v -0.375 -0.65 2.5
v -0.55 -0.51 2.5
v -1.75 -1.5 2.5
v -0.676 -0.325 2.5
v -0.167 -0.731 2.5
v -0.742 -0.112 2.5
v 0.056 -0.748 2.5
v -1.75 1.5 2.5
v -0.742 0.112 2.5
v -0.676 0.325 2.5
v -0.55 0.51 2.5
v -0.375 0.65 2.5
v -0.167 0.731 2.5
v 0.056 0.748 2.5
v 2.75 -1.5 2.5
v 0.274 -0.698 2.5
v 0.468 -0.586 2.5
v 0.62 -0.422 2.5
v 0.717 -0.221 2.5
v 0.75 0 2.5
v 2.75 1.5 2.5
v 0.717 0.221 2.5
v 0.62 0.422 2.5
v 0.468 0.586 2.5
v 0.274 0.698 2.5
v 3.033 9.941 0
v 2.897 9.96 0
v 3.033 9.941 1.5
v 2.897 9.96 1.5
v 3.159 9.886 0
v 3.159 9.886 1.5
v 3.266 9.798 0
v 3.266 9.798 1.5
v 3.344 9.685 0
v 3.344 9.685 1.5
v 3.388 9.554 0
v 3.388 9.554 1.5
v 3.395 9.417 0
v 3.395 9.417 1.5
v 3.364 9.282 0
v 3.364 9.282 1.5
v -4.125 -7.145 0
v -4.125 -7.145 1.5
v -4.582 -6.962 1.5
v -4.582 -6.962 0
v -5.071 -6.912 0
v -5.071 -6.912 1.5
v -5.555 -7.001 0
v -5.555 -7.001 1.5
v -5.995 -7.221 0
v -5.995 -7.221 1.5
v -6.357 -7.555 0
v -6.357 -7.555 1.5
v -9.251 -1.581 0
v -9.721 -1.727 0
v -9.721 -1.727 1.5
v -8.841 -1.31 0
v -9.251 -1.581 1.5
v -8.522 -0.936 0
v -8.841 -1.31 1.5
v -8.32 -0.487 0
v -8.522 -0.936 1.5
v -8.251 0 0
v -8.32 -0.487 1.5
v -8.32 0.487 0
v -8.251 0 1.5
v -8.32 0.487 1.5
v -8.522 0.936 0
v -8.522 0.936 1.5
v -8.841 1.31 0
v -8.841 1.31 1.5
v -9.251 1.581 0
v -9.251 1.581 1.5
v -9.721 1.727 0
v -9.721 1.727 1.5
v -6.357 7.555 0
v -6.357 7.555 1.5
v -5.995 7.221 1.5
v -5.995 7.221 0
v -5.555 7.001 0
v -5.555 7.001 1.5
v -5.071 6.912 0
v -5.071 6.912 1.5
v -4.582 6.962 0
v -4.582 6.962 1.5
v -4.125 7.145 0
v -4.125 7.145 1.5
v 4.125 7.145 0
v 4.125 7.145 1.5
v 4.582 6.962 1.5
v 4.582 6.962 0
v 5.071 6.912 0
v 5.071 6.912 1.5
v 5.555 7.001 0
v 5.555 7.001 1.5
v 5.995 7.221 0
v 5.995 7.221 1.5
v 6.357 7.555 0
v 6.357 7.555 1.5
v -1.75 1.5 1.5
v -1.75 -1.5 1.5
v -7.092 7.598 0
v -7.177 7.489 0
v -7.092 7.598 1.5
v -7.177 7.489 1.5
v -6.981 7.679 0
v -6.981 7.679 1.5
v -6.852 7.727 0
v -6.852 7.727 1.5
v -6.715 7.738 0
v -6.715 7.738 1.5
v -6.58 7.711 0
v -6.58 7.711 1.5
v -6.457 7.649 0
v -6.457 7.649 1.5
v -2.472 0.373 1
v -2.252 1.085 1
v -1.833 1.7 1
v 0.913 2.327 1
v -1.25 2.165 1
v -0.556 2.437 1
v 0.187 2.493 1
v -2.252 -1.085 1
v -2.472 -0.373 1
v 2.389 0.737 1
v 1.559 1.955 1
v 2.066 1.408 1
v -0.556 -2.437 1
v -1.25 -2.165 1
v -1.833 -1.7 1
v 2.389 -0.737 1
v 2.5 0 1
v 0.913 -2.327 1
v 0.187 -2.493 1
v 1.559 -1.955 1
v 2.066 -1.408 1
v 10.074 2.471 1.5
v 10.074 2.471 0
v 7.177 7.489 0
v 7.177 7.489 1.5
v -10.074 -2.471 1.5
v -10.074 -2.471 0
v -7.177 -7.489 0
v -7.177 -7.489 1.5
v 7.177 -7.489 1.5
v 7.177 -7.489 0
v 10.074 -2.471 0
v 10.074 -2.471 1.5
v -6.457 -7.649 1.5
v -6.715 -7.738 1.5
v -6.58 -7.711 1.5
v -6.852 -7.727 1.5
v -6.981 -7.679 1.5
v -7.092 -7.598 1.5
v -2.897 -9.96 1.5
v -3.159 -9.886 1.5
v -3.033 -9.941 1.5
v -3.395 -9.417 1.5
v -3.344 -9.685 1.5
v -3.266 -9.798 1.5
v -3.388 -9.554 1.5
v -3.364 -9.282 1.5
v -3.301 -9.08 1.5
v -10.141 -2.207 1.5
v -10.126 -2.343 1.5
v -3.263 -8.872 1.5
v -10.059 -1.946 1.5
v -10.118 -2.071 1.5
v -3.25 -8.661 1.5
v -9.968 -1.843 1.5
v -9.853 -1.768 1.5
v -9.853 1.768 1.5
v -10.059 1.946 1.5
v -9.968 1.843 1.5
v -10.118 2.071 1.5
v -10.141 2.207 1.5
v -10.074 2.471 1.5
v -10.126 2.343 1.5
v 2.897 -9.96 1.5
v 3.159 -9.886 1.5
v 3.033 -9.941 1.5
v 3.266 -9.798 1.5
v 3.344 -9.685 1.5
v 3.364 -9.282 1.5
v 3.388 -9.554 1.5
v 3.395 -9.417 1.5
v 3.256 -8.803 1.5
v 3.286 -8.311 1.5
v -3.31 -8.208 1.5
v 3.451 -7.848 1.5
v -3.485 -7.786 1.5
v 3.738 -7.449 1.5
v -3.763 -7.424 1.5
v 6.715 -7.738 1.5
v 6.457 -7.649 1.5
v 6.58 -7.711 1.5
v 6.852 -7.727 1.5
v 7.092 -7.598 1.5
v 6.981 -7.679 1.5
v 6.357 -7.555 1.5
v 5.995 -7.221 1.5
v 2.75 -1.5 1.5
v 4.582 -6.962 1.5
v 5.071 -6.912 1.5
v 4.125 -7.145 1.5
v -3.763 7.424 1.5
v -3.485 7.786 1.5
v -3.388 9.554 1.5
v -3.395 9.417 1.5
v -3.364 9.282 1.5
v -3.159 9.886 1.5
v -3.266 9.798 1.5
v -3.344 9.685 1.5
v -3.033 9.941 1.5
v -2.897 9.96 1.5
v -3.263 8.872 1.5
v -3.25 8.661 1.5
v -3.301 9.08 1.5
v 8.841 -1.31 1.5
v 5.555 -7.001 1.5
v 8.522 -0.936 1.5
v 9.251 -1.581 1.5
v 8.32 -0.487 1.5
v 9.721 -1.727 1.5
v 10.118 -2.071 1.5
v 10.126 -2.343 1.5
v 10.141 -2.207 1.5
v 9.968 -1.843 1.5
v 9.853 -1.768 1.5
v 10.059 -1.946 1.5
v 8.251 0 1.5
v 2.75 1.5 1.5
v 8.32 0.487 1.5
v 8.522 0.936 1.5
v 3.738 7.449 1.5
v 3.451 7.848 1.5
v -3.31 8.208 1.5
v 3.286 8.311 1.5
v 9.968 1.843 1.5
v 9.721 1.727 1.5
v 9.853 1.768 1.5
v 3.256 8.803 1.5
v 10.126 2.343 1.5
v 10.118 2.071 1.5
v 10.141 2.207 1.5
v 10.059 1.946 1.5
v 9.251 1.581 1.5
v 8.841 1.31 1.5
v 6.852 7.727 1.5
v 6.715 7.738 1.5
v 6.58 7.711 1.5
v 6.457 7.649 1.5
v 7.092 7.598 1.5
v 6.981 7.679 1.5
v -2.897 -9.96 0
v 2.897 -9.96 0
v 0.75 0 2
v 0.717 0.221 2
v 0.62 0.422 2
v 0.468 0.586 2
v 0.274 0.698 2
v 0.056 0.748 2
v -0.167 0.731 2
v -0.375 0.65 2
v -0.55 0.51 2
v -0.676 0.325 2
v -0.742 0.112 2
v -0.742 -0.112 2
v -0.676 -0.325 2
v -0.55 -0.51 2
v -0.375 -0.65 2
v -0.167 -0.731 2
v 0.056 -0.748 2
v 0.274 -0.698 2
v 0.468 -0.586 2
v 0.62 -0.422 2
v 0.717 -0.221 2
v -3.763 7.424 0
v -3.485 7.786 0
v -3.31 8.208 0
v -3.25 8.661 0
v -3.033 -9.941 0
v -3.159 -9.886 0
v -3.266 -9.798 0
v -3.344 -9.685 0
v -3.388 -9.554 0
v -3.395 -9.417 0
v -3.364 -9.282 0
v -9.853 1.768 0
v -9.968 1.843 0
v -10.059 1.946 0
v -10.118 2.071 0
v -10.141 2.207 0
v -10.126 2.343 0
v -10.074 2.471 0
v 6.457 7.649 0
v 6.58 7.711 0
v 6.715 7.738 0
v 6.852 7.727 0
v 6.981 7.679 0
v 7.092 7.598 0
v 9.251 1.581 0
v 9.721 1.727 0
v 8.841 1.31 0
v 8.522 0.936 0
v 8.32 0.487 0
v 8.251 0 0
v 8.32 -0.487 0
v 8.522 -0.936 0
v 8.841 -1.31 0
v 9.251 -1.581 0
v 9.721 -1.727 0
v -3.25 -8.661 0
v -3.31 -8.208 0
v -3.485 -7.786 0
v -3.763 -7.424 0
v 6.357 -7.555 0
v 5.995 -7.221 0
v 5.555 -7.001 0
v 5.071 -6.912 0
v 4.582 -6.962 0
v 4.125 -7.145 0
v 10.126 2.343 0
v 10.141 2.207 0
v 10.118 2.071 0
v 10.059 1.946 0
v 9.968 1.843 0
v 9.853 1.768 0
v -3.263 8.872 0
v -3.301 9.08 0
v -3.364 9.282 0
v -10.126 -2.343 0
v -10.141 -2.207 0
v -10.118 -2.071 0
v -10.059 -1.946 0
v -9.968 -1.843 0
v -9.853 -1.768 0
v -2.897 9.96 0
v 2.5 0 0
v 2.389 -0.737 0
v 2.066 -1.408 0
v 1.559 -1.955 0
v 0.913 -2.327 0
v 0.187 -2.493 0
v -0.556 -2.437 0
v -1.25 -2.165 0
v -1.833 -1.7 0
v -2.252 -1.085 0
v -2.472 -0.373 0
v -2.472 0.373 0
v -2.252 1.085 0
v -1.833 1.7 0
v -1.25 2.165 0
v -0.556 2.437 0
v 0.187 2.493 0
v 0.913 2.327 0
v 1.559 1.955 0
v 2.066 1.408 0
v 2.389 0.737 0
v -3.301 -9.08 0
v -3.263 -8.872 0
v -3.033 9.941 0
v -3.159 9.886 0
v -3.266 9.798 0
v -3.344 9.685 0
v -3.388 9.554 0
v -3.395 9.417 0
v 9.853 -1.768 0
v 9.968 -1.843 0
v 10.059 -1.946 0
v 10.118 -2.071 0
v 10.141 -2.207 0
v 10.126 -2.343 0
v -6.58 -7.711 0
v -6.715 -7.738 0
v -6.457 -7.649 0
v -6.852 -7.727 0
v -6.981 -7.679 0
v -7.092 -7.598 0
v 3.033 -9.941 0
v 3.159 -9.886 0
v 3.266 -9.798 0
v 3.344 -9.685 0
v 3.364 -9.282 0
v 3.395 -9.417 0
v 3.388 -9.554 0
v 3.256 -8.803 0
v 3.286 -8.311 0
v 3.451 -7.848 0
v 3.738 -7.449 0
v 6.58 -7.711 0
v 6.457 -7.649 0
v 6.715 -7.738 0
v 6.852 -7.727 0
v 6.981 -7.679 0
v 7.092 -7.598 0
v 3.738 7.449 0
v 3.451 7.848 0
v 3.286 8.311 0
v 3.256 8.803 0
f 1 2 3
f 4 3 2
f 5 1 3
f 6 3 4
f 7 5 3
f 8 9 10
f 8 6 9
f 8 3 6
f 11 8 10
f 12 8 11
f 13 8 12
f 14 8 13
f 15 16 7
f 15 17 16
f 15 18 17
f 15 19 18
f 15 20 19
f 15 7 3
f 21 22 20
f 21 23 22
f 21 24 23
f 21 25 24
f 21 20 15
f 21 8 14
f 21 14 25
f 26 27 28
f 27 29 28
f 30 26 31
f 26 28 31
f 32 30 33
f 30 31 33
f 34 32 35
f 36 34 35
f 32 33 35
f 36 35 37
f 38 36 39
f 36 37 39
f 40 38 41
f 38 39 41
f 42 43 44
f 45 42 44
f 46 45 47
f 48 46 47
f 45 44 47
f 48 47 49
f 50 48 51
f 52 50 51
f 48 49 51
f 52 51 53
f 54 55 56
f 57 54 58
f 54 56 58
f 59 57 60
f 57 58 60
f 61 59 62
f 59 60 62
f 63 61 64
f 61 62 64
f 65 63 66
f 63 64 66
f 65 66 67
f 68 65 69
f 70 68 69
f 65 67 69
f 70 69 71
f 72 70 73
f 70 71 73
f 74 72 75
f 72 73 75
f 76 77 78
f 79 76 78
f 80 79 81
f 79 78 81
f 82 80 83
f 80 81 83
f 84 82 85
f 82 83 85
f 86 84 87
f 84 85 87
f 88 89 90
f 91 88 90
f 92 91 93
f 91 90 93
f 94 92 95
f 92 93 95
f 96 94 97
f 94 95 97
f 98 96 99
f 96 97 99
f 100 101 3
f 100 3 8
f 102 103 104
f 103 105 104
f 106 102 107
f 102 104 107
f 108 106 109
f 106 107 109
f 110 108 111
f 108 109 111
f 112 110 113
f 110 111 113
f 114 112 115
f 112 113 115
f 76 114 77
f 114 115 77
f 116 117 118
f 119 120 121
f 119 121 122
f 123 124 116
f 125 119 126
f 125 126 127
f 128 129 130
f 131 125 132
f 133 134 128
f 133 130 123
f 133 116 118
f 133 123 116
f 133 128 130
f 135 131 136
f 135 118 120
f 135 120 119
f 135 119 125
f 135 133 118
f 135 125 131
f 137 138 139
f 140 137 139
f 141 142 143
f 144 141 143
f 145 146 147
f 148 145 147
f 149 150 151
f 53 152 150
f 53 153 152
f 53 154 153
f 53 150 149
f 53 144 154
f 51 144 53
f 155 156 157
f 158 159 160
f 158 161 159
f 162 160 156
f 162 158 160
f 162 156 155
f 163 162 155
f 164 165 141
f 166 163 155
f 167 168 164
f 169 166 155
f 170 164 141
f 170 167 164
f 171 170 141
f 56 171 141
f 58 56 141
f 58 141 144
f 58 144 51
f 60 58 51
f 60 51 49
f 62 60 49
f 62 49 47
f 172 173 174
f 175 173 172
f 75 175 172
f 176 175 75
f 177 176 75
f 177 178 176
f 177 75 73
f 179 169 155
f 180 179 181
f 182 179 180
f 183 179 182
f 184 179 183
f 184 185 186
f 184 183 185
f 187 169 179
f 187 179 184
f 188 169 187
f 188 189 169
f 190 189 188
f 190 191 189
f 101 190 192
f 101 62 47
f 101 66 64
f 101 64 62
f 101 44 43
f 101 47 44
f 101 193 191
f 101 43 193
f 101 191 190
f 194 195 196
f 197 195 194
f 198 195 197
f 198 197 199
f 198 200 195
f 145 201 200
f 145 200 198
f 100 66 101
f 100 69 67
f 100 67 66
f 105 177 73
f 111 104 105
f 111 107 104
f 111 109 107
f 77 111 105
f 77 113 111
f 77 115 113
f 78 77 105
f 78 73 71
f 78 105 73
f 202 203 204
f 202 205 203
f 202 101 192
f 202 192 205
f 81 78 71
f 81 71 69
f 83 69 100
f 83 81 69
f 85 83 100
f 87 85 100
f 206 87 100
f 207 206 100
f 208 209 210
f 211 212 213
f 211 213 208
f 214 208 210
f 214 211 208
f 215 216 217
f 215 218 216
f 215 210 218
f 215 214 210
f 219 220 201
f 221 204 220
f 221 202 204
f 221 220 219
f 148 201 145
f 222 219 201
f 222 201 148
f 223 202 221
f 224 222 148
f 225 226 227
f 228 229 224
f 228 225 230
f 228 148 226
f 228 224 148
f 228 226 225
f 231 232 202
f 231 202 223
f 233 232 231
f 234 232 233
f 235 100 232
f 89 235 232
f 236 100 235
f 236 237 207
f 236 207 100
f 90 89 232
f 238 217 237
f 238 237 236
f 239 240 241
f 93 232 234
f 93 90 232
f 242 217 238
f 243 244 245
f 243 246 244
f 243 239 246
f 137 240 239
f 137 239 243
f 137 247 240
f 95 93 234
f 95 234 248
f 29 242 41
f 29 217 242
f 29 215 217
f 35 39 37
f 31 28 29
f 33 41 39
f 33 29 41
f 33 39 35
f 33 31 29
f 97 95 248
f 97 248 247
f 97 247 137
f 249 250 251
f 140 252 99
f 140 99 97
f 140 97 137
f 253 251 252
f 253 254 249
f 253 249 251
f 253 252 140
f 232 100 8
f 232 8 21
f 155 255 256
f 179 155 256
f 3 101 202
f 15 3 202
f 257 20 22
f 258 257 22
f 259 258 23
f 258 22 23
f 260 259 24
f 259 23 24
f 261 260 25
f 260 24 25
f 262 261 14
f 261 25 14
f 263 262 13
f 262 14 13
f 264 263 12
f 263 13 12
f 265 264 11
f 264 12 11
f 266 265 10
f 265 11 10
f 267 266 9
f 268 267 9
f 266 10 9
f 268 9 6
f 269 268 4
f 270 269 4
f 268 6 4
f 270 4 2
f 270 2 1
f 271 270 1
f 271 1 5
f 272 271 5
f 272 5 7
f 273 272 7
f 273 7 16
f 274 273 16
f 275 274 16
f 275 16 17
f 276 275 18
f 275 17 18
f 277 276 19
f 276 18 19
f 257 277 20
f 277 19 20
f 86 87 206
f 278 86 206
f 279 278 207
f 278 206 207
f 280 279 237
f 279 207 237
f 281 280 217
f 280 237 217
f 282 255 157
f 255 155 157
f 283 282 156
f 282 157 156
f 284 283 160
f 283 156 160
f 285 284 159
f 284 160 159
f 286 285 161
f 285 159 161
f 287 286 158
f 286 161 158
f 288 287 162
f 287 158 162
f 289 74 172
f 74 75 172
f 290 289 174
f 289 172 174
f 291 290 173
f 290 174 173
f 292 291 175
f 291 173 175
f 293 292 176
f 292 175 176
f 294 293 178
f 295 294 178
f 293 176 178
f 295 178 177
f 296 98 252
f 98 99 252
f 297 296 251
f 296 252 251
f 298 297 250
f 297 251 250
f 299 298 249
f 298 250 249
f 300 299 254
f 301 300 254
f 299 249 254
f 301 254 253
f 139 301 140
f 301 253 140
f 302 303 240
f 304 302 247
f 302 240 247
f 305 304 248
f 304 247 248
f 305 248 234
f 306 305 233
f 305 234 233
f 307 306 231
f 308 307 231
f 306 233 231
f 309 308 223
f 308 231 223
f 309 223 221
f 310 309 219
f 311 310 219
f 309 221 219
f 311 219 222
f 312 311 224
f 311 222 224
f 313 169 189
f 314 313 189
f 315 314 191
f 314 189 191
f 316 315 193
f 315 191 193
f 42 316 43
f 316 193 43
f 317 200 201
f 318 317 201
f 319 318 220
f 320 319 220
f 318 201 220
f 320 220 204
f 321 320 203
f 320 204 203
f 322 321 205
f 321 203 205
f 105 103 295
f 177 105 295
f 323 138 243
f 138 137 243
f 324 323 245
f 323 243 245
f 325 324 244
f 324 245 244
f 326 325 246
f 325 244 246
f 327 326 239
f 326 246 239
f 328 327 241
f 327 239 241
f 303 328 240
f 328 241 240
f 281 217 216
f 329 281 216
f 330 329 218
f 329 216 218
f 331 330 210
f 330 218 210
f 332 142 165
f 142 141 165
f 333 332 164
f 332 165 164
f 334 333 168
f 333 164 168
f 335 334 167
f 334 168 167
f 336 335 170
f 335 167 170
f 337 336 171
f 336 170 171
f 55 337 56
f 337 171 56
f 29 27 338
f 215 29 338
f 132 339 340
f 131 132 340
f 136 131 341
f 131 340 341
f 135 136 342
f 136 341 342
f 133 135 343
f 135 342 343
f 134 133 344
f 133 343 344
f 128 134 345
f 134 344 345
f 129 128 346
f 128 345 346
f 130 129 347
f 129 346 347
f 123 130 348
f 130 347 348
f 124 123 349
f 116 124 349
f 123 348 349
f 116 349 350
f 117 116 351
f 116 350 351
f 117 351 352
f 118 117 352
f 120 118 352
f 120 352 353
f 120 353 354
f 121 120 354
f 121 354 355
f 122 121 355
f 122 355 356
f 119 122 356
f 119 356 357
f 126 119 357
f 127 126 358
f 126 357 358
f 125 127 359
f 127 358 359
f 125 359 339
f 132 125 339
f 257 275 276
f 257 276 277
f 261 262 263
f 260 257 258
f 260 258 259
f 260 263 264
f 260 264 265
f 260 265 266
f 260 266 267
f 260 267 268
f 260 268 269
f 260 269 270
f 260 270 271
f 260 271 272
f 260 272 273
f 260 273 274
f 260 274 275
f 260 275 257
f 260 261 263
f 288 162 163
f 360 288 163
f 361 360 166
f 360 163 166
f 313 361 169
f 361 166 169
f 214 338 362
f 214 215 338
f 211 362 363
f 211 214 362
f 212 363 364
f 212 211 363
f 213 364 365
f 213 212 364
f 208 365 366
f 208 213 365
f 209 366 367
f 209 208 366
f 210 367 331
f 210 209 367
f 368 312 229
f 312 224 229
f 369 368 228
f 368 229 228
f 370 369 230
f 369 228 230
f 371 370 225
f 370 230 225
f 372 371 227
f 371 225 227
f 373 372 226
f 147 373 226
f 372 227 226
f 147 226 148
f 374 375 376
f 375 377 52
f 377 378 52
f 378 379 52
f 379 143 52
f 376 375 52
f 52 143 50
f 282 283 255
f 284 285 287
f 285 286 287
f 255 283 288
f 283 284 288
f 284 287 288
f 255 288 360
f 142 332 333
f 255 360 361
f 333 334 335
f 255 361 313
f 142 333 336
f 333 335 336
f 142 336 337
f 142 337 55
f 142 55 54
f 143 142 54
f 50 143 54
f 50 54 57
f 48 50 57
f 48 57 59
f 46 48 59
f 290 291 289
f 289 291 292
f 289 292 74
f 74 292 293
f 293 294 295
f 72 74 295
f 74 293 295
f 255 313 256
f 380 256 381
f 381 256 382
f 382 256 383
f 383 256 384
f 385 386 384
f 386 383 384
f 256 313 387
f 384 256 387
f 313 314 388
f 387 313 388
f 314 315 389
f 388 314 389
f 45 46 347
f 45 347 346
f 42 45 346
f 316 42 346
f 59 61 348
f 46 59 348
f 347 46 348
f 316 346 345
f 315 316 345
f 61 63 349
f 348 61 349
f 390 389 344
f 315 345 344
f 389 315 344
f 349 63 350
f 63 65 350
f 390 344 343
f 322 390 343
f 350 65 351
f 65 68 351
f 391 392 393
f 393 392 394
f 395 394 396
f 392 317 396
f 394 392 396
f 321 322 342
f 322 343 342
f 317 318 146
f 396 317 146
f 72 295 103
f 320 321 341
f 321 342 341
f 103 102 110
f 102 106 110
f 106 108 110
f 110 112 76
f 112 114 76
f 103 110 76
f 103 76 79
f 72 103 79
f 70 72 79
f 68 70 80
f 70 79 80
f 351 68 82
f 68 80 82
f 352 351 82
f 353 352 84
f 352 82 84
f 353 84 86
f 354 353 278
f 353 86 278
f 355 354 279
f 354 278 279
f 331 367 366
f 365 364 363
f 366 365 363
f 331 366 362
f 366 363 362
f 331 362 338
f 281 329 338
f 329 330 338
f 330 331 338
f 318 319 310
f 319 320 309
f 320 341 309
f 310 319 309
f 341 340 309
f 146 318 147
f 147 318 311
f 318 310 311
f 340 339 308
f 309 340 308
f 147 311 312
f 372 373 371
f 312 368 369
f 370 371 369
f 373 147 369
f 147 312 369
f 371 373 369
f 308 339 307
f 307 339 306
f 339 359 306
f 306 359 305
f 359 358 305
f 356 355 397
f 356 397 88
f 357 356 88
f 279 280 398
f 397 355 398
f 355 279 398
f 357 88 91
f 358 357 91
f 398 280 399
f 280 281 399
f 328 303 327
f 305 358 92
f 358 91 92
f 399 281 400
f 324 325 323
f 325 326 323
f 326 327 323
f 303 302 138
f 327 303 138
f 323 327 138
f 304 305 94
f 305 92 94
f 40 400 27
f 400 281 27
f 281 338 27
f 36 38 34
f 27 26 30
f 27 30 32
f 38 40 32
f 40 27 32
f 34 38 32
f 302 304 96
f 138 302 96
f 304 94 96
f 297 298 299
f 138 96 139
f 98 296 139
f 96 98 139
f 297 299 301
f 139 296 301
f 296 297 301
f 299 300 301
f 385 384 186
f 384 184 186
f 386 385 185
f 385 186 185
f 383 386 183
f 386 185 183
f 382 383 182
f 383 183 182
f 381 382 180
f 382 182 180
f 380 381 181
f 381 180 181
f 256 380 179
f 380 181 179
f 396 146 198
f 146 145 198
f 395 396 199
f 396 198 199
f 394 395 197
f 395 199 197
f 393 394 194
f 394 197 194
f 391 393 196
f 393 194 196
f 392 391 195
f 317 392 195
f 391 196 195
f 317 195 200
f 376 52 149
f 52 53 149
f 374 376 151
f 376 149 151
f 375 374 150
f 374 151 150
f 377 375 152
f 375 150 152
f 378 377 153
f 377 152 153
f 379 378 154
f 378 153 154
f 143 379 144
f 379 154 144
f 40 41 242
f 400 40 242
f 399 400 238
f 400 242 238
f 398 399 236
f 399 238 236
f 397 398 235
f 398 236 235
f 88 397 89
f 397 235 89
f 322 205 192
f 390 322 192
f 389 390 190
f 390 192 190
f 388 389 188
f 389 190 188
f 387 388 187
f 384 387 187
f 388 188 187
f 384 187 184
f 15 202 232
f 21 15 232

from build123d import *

# Parameters (mm, degrees)
F1_DEPTH  = 1.5
F2_R      = 1.75
F3_DEPTH  = 25
F4_R      = 0.5
F5_R      = 2.5
F6_DEPTH  = 1
F7_W      = 4.5
F7_H      = 3
F8_DEPTH  = 1
F9_R      = 0.75
F10_DEPTH = 0.5


with BuildPart() as f1:
    # F0 (on Top) → F1 (new body)
    with BuildSketch(Plane.XY):
        Polygon((5.7504086811, 9.96), (-5.7504086811, 9.96), (-11.5008173623, 0), (-5.7504086811, -9.96), (5.7504086811, -9.96), (11.5008173623, 0), align=None)
    extrude(amount=F1_DEPTH)

    # F2 (on face) → F3 (cut)
    with BuildSketch(Plane.XY.offset(1.5)):
        with BuildLine():
            ThreePointArc((6.7504086811, 8.6609618943), (4.1254086811, 10.1765063509), (4.1254086811, 7.1454174377))
            ThreePointArc((4.1254086811, 7.1454174377), (5.8754086811, 7.1454174377), (6.7504086811, 8.6609618943))
        make_face()
        with BuildLine():
            ThreePointArc((11.7508173623, 0), (10.0008173623, 1.75), (8.2508173623, 0))
            ThreePointArc((8.2508173623, 0), (10.0008173623, -1.75), (11.7508173623, 0))
        make_face()
        with BuildLine():
            ThreePointArc((6.7504086811, -8.6609618943), (5.8754086811, -7.1454174377), (4.1254086811, -7.1454174377))
            ThreePointArc((4.1254086811, -7.1454174377), (4.1254086811, -10.1765063509), (6.7504086811, -8.6609618943))
        make_face()
        with BuildLine():
            ThreePointArc((-3.2504086811, -8.6609618943), (-3.4848642245, -7.7859618943), (-4.1254086811, -7.1454174377))
            ThreePointArc((-4.1254086811, -7.1454174377), (-6.5159531378, -9.5359618943), (-3.2504086811, -8.6609618943))
        make_face()
        with Locations((-10.0008173623, 0)):
            Circle(F2_R)
        with BuildLine():
            ThreePointArc((-3.2504086811, 8.6609618943), (-6.5159531378, 9.5359618943), (-4.1254086811, 7.1454174377))
            ThreePointArc((-4.1254086811, 7.1454174377), (-3.4848642245, 7.7859618943), (-3.2504086811, 8.6609618943))
        make_face()
    extrude(amount=-F3_DEPTH, mode=Mode.SUBTRACT)

    # F4
    f4_edges = [f1.edges().sort_by_distance(p)[0] for p in [
        (-3.827805, 9.96, 0.75),
        (-6.711711, 8.294976, 0.75),
        (3.827805, 9.96, 0.75),
        (6.711711, 8.294976, 0.75),
        (-10.539515, 1.665024, 0.75),
        (-10.539515, -1.665024, 0.75),
        (-3.827805, -9.96, 0.75),
        (-6.711711, -8.294976, 0.75),
        (3.827805, -9.96, 0.75),
        (6.711711, -8.294976, 0.75),
        (10.539515, 1.665024, 0.75),
        (10.539515, -1.665024, 0.75),
    ]]
    fillet(f4_edges, radius=F4_R)

    # F5 (on face) → F6 (cut)
    with BuildSketch(Plane(origin=(0, 0, 0), x_dir=(1, 0, 0), z_dir=(0, 0, -1))):
        Circle(F5_R)
    extrude(amount=-F6_DEPTH, mode=Mode.SUBTRACT)

    # F7 (on face) → F8 (join)
    with BuildSketch(Plane.XY.offset(1.5)):
        with Locations((0.5, 0)):
            Rectangle(F7_W, F7_H)
    extrude(amount=F8_DEPTH)

    # F9 (on face) → F10 (cut)
    with BuildSketch(Plane.XY.offset(2.5)):
        Circle(F9_R)
    extrude(amount=-F10_DEPTH, mode=Mode.SUBTRACT)


solid = f1.part
